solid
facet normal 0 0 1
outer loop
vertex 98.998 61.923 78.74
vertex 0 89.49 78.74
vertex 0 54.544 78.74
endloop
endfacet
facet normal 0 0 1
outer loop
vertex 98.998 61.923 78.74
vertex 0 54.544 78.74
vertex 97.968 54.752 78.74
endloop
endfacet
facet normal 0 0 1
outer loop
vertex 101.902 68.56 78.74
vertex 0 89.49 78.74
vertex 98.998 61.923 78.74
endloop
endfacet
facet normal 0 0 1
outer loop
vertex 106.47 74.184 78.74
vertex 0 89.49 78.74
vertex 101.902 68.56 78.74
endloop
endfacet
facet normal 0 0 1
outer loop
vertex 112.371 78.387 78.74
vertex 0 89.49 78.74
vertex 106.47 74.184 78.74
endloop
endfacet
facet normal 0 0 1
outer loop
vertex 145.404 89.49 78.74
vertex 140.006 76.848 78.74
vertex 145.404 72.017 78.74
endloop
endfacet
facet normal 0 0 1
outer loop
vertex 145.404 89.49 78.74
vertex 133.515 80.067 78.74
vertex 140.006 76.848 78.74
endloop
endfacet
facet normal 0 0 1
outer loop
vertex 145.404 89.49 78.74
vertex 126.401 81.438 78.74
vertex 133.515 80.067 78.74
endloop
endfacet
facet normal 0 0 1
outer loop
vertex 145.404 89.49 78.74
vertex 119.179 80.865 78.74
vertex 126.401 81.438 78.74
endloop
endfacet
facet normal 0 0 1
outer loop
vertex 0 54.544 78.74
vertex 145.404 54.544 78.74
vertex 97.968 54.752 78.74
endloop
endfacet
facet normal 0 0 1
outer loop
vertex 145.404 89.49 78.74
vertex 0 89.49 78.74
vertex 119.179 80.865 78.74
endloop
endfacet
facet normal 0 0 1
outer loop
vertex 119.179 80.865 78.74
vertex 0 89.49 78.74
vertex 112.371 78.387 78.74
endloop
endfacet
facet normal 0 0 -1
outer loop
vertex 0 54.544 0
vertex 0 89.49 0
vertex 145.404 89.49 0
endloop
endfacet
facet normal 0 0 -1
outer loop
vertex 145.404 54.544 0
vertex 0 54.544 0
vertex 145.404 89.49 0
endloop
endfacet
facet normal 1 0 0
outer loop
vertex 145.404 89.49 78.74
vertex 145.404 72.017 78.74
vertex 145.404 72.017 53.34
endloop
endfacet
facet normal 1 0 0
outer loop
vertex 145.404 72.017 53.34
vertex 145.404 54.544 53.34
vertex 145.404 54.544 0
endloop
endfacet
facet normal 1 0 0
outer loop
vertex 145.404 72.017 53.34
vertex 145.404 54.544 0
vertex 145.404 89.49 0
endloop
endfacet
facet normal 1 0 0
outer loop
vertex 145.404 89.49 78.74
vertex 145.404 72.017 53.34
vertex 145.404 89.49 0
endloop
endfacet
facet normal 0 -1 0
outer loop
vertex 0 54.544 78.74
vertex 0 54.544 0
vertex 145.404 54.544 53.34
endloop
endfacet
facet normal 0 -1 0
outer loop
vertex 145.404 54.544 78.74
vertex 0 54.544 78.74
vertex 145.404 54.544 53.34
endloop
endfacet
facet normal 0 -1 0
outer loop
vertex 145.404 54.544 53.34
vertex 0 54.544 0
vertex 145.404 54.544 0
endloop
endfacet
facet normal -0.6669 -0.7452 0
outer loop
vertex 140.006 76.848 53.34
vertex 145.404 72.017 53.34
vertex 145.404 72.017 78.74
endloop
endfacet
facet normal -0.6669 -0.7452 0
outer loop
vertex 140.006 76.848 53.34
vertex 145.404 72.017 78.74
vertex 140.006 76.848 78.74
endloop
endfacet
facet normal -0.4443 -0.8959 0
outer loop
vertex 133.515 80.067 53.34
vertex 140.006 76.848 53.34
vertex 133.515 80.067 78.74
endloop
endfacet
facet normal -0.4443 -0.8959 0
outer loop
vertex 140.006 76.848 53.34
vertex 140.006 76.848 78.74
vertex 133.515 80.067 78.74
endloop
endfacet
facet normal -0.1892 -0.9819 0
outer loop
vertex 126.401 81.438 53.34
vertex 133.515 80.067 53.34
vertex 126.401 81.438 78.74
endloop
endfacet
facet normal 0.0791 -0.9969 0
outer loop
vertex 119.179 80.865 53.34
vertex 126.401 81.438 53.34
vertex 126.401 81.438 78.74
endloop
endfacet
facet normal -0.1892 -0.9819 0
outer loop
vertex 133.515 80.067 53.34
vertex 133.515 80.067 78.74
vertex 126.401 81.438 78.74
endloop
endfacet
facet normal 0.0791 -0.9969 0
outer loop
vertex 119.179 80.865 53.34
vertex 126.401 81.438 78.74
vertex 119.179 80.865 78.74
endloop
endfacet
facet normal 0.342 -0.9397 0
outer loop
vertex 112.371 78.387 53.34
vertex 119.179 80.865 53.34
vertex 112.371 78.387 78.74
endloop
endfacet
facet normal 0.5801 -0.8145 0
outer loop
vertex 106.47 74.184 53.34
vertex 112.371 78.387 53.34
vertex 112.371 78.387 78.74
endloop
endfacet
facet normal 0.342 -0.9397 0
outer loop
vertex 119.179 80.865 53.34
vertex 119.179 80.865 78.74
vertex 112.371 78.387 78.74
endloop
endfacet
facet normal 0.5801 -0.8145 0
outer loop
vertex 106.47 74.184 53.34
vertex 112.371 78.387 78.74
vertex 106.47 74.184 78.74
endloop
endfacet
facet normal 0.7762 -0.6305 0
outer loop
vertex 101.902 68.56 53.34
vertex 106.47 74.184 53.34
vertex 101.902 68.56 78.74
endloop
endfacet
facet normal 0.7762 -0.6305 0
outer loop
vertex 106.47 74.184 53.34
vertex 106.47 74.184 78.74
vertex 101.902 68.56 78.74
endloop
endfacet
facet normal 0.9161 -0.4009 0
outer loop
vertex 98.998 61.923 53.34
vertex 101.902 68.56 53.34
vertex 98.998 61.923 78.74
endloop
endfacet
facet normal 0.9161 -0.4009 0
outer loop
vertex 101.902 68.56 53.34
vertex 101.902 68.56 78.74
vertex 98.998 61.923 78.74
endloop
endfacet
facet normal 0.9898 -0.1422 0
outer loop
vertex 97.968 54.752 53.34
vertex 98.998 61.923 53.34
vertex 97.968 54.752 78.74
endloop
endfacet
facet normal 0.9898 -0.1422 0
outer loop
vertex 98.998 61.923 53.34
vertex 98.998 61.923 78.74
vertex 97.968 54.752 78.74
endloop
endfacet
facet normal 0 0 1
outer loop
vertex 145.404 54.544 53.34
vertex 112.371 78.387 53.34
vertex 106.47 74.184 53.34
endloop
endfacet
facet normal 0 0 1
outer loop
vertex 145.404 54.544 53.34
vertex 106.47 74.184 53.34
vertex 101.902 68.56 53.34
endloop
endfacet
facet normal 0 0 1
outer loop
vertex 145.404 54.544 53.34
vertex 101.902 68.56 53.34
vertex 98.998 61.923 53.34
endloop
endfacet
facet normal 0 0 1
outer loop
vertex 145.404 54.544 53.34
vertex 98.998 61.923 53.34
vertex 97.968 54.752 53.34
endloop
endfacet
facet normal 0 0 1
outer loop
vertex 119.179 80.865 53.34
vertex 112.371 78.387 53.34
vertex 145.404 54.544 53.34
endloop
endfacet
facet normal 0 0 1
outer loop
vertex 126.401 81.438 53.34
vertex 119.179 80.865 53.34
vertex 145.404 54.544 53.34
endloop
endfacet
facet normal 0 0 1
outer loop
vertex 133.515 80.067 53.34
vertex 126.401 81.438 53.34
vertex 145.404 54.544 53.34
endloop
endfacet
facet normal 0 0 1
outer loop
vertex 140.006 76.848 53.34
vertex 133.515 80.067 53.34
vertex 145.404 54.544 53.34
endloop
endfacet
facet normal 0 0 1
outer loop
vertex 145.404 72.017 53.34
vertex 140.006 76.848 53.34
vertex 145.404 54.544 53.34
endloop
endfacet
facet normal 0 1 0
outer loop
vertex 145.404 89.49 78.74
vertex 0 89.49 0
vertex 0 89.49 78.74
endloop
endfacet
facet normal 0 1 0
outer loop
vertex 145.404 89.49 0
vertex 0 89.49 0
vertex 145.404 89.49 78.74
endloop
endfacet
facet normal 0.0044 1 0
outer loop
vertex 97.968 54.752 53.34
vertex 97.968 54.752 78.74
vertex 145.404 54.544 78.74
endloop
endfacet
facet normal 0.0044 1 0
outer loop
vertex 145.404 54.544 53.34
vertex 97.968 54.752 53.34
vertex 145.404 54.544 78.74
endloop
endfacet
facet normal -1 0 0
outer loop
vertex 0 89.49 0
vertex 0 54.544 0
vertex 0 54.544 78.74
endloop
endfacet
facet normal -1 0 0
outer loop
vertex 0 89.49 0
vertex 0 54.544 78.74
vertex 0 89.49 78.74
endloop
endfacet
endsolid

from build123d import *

# Parameters (mm, degrees)
F0_W     = 145.4039812088
F0_H     = 34.9461883307
F1_DEPTH = 78.74
F5_DEPTH = 25.4


# Not quite as in the source:
# - the program builds the solid bodies; features that only make, move or delete a surface that nothing else refers to are left out


with BuildPart() as f1:
    # F0 (on Top) → F1 (new body)
    with BuildSketch(Plane.XY):
        with Locations((72.7019906044, 72.0167830586)):
            Rectangle(F0_W, F0_H)
    extrude(amount=F1_DEPTH)

    # F4 (on face) → F5 (cut)
    with BuildSketch(Plane.XY.offset(78.74)):
        with BuildLine():
            Line((145.4039812088, 54.5436888933), (145.4039812088, 72.0167830586))
            ThreePointArc((145.4039812088, 72.0167830586), (115.6911009346, 79.8555366854), (97.9683505694, 54.7516439176))
            Line((97.9683505694, 54.7516439176), (145.4039812088, 54.5436888933))
        make_face()
    extrude(amount=-F5_DEPTH, mode=Mode.SUBTRACT)


solid = f1.part
